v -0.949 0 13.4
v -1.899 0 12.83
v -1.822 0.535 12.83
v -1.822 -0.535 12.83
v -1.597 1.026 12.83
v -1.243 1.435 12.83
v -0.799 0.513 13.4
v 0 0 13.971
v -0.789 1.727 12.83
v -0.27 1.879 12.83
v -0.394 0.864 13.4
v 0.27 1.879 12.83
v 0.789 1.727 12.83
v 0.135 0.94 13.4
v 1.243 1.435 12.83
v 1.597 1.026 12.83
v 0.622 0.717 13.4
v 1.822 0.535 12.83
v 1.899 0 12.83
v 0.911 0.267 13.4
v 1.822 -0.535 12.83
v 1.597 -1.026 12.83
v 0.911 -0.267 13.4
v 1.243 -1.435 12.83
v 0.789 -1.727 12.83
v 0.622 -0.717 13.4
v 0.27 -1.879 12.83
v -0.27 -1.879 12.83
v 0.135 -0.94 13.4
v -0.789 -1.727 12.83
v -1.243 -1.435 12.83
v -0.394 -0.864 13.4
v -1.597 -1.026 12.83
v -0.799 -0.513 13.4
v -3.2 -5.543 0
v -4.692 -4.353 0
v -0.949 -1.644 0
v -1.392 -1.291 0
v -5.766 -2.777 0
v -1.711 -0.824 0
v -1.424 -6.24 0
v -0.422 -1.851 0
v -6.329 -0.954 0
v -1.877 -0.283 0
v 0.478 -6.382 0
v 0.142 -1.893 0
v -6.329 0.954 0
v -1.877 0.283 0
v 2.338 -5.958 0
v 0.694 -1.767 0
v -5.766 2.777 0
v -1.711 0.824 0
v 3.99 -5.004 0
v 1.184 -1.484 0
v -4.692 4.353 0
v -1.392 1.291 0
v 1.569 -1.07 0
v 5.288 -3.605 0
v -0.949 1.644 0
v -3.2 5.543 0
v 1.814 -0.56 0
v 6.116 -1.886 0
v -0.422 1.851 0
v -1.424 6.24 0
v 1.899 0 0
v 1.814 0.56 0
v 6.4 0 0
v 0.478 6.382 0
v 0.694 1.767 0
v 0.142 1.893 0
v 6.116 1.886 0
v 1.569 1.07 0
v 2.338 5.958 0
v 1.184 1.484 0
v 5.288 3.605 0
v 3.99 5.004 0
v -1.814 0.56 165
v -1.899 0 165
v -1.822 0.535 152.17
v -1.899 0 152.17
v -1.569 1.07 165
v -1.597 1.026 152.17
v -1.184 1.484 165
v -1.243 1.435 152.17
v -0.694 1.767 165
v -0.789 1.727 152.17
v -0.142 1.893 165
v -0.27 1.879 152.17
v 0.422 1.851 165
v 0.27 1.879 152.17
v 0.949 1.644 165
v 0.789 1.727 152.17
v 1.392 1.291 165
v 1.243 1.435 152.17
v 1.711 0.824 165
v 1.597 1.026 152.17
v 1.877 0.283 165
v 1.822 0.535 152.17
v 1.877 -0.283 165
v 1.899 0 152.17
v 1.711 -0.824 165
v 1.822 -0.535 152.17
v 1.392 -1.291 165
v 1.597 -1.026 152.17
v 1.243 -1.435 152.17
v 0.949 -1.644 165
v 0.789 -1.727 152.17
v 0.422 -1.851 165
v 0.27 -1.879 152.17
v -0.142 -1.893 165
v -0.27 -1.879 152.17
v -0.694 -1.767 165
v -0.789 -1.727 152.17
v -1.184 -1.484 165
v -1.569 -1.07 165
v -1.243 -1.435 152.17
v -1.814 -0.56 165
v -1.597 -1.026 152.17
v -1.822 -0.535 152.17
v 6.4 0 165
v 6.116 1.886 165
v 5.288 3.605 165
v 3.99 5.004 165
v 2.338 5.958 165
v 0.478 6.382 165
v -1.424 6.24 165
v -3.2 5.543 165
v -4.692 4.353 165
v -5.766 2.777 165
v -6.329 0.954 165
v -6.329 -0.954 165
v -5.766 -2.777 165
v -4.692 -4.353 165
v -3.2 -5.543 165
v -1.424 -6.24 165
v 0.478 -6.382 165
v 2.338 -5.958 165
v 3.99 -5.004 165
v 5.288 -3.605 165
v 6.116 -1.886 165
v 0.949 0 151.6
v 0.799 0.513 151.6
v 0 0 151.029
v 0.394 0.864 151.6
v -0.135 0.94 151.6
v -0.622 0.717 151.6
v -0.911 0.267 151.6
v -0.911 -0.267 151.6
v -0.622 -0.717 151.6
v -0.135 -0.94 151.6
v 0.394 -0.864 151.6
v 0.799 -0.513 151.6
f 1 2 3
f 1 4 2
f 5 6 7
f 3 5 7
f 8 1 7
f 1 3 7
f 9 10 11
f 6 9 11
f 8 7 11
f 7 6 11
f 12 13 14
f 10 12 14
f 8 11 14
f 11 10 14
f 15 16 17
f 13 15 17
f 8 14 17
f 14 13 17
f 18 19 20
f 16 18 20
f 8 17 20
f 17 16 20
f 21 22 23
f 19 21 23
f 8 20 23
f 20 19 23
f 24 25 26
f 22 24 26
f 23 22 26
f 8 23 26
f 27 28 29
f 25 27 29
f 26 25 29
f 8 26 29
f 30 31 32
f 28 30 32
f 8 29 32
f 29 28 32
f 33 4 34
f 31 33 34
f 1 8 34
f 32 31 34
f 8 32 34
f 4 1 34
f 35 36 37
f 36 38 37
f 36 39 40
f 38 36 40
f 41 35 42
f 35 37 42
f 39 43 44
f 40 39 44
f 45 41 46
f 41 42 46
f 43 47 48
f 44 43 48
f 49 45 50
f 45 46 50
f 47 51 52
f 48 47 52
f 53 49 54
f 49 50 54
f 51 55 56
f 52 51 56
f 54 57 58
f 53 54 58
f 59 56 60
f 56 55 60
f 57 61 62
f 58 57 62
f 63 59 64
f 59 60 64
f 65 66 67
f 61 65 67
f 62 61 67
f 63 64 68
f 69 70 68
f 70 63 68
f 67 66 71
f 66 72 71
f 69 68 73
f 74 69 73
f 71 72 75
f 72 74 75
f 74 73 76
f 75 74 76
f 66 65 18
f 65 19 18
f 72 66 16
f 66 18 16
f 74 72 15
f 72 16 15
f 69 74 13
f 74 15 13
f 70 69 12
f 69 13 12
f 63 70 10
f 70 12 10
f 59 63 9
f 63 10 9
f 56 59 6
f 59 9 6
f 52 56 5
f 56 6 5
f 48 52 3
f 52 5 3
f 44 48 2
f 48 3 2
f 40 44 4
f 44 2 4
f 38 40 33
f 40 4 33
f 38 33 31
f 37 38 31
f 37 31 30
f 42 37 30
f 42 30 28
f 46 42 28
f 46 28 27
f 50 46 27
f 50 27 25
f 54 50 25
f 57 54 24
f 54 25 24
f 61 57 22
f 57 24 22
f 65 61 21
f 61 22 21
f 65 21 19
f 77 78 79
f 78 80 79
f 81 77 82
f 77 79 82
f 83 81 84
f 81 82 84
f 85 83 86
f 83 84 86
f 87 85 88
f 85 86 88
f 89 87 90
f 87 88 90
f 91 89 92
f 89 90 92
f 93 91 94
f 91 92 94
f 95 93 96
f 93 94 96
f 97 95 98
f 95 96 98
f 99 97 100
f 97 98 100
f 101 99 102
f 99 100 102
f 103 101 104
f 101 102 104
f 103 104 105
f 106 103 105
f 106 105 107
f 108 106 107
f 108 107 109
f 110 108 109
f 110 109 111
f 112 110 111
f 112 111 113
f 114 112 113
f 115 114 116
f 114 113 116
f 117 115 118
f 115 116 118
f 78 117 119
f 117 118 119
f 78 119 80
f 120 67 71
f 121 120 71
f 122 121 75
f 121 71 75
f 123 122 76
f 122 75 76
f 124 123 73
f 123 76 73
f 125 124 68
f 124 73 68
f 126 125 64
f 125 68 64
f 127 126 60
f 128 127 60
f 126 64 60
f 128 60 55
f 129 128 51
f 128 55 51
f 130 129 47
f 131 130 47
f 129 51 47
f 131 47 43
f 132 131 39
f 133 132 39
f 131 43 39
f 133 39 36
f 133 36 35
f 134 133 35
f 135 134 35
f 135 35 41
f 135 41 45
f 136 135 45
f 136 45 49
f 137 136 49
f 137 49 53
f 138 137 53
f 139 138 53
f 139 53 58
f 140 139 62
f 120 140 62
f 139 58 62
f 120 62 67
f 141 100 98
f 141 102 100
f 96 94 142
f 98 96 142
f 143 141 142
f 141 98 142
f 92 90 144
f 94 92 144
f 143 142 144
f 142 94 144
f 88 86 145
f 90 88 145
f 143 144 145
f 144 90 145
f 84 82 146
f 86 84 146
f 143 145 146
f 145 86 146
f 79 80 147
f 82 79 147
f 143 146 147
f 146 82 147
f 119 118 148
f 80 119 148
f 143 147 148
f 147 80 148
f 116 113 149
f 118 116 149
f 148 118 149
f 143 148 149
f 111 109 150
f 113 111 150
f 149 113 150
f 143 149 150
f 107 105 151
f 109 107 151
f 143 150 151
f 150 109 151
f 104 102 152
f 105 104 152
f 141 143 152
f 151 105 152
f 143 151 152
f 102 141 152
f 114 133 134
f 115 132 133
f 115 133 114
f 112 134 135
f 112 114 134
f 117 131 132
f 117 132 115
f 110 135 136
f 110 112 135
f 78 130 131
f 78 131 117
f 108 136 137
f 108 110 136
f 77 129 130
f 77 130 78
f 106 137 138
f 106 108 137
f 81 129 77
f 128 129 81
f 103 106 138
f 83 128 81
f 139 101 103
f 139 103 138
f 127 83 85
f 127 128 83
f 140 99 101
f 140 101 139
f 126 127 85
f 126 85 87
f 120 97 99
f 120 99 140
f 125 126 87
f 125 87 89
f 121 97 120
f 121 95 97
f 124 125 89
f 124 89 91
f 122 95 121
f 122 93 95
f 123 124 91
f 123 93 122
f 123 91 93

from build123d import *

# Parameters (mm, degrees)
SKETCH1_R                  = 6.4
BOSS_EXTRUDE1_DEPTH        = 165
F_10_24_TAPPED_HOLE1_D     = 3.7973
F_10_24_TAPPED_HOLE1_DEPTH = 12.83
F_10_24_TAPPED_HOLE1_TIP   = 1.140824014
F_10_24_TAPPED_HOLE2_D     = 3.7973
F_10_24_TAPPED_HOLE2_DEPTH = 12.83
F_10_24_TAPPED_HOLE2_TIP   = 1.140824014


with BuildPart() as part:
    # Sketch1 → Boss-Extrude1 (new body)
    with BuildSketch(Plane.XY):
        Circle(SKETCH1_R)
    extrude(amount=BOSS_EXTRUDE1_DEPTH)

    # #10-24 Tapped Hole1
    with Locations(Plane(origin=(0, 0, 0), x_dir=(-1, 0, 0), z_dir=(0, 0, -1))):
        with Locations((0, 0)):
            Hole(F_10_24_TAPPED_HOLE1_D / 2, depth=F_10_24_TAPPED_HOLE1_DEPTH)
            with Locations((0, 0, -(F_10_24_TAPPED_HOLE1_DEPTH + F_10_24_TAPPED_HOLE1_TIP / 2))):  # 118° drill point
                Cone(0, F_10_24_TAPPED_HOLE1_D / 2, F_10_24_TAPPED_HOLE1_TIP, mode=Mode.SUBTRACT)

    # #10-24 Tapped Hole2
    with Locations(Plane.XY.offset(165)):
        with Locations((0, 0)):
            Hole(F_10_24_TAPPED_HOLE2_D / 2, depth=F_10_24_TAPPED_HOLE2_DEPTH)
            with Locations((0, 0, -(F_10_24_TAPPED_HOLE2_DEPTH + F_10_24_TAPPED_HOLE2_TIP / 2))):  # 118° drill point
                Cone(0, F_10_24_TAPPED_HOLE2_D / 2, F_10_24_TAPPED_HOLE2_TIP, mode=Mode.SUBTRACT)


solid = part.part
